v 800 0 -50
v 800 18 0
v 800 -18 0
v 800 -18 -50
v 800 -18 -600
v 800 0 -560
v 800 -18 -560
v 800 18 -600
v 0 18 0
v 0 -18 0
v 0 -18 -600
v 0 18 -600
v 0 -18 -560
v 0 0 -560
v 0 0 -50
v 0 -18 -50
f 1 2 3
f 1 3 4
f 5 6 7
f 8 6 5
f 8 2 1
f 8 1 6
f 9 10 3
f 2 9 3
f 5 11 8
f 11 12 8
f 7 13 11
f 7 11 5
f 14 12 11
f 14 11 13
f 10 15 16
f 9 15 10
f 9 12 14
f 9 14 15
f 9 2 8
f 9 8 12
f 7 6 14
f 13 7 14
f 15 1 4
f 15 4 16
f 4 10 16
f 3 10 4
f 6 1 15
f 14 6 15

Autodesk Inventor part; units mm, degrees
ref_plane "YZ Plane" through (0, 0, 0) normal (1, 0, 0) x (0, 1, 0)
ref_plane "XZ Plane" through (0, 0, 0) normal (0, 1, 0) x (-1, 0, 0)
ref_plane "XY Plane" through (0, 0, 0) normal (0, 0, 1) x (1, 0, 0)
sketch "Sketch2" plane through (0, 0, 0) normal (0, 1, 0) x (-1, 0, 0)
  line L0 (0, 0) -> (-800, 0)
  line L1 (-800, 0) -> (-800, -600)
  line L2 (-800, -600) -> (0, -600)
  line L3 (0, -600) -> (0, 0)
  dimension "d4" = 800
  dimension "d5" = 600
extrude "Extrusion2" add sketch "Sketch2" along normal blind 18
sketch "Sketch3" plane through (0, 0, 0) normal (0, -1, 0) x (1, 0, 0)
  line L0 (0, -600) -> (0, 0) projected
  line L1 (800, 0) -> (800, -600) projected
  line L2 (0, 0) -> (800, 0)
  line L3 (800, 0) -> (800, -50)
  line L4 (800, -50) -> (0, -50)
  line L5 (0, -50) -> (0, 0)
  dimension "d8" = 50
extrude "Extrusion3" add sketch "Sketch3" along normal blind 18
sketch "Sketch4" plane through (0, 0, 0) normal (0, -1, 0) x (1, 0, 0)
  line L0 (0, -600) -> (0, 0) projected
  line L1 (800, 0) -> (800, -600) projected
  line L2 (0, -600) -> (800, -600)
  line L3 (800, -600) -> (800, -560)
  line L4 (800, -560) -> (0, -560)
  line L5 (0, -560) -> (0, -600)
  dimension "d11" = 40
extrude "Extrusion4" add sketch "Sketch4" along normal blind 18
equation "\"d5\" = Profundidad"
equation "\"Profundidad\" = 600"
properties part number "tablero_chico" material "Wood (Birch)"
